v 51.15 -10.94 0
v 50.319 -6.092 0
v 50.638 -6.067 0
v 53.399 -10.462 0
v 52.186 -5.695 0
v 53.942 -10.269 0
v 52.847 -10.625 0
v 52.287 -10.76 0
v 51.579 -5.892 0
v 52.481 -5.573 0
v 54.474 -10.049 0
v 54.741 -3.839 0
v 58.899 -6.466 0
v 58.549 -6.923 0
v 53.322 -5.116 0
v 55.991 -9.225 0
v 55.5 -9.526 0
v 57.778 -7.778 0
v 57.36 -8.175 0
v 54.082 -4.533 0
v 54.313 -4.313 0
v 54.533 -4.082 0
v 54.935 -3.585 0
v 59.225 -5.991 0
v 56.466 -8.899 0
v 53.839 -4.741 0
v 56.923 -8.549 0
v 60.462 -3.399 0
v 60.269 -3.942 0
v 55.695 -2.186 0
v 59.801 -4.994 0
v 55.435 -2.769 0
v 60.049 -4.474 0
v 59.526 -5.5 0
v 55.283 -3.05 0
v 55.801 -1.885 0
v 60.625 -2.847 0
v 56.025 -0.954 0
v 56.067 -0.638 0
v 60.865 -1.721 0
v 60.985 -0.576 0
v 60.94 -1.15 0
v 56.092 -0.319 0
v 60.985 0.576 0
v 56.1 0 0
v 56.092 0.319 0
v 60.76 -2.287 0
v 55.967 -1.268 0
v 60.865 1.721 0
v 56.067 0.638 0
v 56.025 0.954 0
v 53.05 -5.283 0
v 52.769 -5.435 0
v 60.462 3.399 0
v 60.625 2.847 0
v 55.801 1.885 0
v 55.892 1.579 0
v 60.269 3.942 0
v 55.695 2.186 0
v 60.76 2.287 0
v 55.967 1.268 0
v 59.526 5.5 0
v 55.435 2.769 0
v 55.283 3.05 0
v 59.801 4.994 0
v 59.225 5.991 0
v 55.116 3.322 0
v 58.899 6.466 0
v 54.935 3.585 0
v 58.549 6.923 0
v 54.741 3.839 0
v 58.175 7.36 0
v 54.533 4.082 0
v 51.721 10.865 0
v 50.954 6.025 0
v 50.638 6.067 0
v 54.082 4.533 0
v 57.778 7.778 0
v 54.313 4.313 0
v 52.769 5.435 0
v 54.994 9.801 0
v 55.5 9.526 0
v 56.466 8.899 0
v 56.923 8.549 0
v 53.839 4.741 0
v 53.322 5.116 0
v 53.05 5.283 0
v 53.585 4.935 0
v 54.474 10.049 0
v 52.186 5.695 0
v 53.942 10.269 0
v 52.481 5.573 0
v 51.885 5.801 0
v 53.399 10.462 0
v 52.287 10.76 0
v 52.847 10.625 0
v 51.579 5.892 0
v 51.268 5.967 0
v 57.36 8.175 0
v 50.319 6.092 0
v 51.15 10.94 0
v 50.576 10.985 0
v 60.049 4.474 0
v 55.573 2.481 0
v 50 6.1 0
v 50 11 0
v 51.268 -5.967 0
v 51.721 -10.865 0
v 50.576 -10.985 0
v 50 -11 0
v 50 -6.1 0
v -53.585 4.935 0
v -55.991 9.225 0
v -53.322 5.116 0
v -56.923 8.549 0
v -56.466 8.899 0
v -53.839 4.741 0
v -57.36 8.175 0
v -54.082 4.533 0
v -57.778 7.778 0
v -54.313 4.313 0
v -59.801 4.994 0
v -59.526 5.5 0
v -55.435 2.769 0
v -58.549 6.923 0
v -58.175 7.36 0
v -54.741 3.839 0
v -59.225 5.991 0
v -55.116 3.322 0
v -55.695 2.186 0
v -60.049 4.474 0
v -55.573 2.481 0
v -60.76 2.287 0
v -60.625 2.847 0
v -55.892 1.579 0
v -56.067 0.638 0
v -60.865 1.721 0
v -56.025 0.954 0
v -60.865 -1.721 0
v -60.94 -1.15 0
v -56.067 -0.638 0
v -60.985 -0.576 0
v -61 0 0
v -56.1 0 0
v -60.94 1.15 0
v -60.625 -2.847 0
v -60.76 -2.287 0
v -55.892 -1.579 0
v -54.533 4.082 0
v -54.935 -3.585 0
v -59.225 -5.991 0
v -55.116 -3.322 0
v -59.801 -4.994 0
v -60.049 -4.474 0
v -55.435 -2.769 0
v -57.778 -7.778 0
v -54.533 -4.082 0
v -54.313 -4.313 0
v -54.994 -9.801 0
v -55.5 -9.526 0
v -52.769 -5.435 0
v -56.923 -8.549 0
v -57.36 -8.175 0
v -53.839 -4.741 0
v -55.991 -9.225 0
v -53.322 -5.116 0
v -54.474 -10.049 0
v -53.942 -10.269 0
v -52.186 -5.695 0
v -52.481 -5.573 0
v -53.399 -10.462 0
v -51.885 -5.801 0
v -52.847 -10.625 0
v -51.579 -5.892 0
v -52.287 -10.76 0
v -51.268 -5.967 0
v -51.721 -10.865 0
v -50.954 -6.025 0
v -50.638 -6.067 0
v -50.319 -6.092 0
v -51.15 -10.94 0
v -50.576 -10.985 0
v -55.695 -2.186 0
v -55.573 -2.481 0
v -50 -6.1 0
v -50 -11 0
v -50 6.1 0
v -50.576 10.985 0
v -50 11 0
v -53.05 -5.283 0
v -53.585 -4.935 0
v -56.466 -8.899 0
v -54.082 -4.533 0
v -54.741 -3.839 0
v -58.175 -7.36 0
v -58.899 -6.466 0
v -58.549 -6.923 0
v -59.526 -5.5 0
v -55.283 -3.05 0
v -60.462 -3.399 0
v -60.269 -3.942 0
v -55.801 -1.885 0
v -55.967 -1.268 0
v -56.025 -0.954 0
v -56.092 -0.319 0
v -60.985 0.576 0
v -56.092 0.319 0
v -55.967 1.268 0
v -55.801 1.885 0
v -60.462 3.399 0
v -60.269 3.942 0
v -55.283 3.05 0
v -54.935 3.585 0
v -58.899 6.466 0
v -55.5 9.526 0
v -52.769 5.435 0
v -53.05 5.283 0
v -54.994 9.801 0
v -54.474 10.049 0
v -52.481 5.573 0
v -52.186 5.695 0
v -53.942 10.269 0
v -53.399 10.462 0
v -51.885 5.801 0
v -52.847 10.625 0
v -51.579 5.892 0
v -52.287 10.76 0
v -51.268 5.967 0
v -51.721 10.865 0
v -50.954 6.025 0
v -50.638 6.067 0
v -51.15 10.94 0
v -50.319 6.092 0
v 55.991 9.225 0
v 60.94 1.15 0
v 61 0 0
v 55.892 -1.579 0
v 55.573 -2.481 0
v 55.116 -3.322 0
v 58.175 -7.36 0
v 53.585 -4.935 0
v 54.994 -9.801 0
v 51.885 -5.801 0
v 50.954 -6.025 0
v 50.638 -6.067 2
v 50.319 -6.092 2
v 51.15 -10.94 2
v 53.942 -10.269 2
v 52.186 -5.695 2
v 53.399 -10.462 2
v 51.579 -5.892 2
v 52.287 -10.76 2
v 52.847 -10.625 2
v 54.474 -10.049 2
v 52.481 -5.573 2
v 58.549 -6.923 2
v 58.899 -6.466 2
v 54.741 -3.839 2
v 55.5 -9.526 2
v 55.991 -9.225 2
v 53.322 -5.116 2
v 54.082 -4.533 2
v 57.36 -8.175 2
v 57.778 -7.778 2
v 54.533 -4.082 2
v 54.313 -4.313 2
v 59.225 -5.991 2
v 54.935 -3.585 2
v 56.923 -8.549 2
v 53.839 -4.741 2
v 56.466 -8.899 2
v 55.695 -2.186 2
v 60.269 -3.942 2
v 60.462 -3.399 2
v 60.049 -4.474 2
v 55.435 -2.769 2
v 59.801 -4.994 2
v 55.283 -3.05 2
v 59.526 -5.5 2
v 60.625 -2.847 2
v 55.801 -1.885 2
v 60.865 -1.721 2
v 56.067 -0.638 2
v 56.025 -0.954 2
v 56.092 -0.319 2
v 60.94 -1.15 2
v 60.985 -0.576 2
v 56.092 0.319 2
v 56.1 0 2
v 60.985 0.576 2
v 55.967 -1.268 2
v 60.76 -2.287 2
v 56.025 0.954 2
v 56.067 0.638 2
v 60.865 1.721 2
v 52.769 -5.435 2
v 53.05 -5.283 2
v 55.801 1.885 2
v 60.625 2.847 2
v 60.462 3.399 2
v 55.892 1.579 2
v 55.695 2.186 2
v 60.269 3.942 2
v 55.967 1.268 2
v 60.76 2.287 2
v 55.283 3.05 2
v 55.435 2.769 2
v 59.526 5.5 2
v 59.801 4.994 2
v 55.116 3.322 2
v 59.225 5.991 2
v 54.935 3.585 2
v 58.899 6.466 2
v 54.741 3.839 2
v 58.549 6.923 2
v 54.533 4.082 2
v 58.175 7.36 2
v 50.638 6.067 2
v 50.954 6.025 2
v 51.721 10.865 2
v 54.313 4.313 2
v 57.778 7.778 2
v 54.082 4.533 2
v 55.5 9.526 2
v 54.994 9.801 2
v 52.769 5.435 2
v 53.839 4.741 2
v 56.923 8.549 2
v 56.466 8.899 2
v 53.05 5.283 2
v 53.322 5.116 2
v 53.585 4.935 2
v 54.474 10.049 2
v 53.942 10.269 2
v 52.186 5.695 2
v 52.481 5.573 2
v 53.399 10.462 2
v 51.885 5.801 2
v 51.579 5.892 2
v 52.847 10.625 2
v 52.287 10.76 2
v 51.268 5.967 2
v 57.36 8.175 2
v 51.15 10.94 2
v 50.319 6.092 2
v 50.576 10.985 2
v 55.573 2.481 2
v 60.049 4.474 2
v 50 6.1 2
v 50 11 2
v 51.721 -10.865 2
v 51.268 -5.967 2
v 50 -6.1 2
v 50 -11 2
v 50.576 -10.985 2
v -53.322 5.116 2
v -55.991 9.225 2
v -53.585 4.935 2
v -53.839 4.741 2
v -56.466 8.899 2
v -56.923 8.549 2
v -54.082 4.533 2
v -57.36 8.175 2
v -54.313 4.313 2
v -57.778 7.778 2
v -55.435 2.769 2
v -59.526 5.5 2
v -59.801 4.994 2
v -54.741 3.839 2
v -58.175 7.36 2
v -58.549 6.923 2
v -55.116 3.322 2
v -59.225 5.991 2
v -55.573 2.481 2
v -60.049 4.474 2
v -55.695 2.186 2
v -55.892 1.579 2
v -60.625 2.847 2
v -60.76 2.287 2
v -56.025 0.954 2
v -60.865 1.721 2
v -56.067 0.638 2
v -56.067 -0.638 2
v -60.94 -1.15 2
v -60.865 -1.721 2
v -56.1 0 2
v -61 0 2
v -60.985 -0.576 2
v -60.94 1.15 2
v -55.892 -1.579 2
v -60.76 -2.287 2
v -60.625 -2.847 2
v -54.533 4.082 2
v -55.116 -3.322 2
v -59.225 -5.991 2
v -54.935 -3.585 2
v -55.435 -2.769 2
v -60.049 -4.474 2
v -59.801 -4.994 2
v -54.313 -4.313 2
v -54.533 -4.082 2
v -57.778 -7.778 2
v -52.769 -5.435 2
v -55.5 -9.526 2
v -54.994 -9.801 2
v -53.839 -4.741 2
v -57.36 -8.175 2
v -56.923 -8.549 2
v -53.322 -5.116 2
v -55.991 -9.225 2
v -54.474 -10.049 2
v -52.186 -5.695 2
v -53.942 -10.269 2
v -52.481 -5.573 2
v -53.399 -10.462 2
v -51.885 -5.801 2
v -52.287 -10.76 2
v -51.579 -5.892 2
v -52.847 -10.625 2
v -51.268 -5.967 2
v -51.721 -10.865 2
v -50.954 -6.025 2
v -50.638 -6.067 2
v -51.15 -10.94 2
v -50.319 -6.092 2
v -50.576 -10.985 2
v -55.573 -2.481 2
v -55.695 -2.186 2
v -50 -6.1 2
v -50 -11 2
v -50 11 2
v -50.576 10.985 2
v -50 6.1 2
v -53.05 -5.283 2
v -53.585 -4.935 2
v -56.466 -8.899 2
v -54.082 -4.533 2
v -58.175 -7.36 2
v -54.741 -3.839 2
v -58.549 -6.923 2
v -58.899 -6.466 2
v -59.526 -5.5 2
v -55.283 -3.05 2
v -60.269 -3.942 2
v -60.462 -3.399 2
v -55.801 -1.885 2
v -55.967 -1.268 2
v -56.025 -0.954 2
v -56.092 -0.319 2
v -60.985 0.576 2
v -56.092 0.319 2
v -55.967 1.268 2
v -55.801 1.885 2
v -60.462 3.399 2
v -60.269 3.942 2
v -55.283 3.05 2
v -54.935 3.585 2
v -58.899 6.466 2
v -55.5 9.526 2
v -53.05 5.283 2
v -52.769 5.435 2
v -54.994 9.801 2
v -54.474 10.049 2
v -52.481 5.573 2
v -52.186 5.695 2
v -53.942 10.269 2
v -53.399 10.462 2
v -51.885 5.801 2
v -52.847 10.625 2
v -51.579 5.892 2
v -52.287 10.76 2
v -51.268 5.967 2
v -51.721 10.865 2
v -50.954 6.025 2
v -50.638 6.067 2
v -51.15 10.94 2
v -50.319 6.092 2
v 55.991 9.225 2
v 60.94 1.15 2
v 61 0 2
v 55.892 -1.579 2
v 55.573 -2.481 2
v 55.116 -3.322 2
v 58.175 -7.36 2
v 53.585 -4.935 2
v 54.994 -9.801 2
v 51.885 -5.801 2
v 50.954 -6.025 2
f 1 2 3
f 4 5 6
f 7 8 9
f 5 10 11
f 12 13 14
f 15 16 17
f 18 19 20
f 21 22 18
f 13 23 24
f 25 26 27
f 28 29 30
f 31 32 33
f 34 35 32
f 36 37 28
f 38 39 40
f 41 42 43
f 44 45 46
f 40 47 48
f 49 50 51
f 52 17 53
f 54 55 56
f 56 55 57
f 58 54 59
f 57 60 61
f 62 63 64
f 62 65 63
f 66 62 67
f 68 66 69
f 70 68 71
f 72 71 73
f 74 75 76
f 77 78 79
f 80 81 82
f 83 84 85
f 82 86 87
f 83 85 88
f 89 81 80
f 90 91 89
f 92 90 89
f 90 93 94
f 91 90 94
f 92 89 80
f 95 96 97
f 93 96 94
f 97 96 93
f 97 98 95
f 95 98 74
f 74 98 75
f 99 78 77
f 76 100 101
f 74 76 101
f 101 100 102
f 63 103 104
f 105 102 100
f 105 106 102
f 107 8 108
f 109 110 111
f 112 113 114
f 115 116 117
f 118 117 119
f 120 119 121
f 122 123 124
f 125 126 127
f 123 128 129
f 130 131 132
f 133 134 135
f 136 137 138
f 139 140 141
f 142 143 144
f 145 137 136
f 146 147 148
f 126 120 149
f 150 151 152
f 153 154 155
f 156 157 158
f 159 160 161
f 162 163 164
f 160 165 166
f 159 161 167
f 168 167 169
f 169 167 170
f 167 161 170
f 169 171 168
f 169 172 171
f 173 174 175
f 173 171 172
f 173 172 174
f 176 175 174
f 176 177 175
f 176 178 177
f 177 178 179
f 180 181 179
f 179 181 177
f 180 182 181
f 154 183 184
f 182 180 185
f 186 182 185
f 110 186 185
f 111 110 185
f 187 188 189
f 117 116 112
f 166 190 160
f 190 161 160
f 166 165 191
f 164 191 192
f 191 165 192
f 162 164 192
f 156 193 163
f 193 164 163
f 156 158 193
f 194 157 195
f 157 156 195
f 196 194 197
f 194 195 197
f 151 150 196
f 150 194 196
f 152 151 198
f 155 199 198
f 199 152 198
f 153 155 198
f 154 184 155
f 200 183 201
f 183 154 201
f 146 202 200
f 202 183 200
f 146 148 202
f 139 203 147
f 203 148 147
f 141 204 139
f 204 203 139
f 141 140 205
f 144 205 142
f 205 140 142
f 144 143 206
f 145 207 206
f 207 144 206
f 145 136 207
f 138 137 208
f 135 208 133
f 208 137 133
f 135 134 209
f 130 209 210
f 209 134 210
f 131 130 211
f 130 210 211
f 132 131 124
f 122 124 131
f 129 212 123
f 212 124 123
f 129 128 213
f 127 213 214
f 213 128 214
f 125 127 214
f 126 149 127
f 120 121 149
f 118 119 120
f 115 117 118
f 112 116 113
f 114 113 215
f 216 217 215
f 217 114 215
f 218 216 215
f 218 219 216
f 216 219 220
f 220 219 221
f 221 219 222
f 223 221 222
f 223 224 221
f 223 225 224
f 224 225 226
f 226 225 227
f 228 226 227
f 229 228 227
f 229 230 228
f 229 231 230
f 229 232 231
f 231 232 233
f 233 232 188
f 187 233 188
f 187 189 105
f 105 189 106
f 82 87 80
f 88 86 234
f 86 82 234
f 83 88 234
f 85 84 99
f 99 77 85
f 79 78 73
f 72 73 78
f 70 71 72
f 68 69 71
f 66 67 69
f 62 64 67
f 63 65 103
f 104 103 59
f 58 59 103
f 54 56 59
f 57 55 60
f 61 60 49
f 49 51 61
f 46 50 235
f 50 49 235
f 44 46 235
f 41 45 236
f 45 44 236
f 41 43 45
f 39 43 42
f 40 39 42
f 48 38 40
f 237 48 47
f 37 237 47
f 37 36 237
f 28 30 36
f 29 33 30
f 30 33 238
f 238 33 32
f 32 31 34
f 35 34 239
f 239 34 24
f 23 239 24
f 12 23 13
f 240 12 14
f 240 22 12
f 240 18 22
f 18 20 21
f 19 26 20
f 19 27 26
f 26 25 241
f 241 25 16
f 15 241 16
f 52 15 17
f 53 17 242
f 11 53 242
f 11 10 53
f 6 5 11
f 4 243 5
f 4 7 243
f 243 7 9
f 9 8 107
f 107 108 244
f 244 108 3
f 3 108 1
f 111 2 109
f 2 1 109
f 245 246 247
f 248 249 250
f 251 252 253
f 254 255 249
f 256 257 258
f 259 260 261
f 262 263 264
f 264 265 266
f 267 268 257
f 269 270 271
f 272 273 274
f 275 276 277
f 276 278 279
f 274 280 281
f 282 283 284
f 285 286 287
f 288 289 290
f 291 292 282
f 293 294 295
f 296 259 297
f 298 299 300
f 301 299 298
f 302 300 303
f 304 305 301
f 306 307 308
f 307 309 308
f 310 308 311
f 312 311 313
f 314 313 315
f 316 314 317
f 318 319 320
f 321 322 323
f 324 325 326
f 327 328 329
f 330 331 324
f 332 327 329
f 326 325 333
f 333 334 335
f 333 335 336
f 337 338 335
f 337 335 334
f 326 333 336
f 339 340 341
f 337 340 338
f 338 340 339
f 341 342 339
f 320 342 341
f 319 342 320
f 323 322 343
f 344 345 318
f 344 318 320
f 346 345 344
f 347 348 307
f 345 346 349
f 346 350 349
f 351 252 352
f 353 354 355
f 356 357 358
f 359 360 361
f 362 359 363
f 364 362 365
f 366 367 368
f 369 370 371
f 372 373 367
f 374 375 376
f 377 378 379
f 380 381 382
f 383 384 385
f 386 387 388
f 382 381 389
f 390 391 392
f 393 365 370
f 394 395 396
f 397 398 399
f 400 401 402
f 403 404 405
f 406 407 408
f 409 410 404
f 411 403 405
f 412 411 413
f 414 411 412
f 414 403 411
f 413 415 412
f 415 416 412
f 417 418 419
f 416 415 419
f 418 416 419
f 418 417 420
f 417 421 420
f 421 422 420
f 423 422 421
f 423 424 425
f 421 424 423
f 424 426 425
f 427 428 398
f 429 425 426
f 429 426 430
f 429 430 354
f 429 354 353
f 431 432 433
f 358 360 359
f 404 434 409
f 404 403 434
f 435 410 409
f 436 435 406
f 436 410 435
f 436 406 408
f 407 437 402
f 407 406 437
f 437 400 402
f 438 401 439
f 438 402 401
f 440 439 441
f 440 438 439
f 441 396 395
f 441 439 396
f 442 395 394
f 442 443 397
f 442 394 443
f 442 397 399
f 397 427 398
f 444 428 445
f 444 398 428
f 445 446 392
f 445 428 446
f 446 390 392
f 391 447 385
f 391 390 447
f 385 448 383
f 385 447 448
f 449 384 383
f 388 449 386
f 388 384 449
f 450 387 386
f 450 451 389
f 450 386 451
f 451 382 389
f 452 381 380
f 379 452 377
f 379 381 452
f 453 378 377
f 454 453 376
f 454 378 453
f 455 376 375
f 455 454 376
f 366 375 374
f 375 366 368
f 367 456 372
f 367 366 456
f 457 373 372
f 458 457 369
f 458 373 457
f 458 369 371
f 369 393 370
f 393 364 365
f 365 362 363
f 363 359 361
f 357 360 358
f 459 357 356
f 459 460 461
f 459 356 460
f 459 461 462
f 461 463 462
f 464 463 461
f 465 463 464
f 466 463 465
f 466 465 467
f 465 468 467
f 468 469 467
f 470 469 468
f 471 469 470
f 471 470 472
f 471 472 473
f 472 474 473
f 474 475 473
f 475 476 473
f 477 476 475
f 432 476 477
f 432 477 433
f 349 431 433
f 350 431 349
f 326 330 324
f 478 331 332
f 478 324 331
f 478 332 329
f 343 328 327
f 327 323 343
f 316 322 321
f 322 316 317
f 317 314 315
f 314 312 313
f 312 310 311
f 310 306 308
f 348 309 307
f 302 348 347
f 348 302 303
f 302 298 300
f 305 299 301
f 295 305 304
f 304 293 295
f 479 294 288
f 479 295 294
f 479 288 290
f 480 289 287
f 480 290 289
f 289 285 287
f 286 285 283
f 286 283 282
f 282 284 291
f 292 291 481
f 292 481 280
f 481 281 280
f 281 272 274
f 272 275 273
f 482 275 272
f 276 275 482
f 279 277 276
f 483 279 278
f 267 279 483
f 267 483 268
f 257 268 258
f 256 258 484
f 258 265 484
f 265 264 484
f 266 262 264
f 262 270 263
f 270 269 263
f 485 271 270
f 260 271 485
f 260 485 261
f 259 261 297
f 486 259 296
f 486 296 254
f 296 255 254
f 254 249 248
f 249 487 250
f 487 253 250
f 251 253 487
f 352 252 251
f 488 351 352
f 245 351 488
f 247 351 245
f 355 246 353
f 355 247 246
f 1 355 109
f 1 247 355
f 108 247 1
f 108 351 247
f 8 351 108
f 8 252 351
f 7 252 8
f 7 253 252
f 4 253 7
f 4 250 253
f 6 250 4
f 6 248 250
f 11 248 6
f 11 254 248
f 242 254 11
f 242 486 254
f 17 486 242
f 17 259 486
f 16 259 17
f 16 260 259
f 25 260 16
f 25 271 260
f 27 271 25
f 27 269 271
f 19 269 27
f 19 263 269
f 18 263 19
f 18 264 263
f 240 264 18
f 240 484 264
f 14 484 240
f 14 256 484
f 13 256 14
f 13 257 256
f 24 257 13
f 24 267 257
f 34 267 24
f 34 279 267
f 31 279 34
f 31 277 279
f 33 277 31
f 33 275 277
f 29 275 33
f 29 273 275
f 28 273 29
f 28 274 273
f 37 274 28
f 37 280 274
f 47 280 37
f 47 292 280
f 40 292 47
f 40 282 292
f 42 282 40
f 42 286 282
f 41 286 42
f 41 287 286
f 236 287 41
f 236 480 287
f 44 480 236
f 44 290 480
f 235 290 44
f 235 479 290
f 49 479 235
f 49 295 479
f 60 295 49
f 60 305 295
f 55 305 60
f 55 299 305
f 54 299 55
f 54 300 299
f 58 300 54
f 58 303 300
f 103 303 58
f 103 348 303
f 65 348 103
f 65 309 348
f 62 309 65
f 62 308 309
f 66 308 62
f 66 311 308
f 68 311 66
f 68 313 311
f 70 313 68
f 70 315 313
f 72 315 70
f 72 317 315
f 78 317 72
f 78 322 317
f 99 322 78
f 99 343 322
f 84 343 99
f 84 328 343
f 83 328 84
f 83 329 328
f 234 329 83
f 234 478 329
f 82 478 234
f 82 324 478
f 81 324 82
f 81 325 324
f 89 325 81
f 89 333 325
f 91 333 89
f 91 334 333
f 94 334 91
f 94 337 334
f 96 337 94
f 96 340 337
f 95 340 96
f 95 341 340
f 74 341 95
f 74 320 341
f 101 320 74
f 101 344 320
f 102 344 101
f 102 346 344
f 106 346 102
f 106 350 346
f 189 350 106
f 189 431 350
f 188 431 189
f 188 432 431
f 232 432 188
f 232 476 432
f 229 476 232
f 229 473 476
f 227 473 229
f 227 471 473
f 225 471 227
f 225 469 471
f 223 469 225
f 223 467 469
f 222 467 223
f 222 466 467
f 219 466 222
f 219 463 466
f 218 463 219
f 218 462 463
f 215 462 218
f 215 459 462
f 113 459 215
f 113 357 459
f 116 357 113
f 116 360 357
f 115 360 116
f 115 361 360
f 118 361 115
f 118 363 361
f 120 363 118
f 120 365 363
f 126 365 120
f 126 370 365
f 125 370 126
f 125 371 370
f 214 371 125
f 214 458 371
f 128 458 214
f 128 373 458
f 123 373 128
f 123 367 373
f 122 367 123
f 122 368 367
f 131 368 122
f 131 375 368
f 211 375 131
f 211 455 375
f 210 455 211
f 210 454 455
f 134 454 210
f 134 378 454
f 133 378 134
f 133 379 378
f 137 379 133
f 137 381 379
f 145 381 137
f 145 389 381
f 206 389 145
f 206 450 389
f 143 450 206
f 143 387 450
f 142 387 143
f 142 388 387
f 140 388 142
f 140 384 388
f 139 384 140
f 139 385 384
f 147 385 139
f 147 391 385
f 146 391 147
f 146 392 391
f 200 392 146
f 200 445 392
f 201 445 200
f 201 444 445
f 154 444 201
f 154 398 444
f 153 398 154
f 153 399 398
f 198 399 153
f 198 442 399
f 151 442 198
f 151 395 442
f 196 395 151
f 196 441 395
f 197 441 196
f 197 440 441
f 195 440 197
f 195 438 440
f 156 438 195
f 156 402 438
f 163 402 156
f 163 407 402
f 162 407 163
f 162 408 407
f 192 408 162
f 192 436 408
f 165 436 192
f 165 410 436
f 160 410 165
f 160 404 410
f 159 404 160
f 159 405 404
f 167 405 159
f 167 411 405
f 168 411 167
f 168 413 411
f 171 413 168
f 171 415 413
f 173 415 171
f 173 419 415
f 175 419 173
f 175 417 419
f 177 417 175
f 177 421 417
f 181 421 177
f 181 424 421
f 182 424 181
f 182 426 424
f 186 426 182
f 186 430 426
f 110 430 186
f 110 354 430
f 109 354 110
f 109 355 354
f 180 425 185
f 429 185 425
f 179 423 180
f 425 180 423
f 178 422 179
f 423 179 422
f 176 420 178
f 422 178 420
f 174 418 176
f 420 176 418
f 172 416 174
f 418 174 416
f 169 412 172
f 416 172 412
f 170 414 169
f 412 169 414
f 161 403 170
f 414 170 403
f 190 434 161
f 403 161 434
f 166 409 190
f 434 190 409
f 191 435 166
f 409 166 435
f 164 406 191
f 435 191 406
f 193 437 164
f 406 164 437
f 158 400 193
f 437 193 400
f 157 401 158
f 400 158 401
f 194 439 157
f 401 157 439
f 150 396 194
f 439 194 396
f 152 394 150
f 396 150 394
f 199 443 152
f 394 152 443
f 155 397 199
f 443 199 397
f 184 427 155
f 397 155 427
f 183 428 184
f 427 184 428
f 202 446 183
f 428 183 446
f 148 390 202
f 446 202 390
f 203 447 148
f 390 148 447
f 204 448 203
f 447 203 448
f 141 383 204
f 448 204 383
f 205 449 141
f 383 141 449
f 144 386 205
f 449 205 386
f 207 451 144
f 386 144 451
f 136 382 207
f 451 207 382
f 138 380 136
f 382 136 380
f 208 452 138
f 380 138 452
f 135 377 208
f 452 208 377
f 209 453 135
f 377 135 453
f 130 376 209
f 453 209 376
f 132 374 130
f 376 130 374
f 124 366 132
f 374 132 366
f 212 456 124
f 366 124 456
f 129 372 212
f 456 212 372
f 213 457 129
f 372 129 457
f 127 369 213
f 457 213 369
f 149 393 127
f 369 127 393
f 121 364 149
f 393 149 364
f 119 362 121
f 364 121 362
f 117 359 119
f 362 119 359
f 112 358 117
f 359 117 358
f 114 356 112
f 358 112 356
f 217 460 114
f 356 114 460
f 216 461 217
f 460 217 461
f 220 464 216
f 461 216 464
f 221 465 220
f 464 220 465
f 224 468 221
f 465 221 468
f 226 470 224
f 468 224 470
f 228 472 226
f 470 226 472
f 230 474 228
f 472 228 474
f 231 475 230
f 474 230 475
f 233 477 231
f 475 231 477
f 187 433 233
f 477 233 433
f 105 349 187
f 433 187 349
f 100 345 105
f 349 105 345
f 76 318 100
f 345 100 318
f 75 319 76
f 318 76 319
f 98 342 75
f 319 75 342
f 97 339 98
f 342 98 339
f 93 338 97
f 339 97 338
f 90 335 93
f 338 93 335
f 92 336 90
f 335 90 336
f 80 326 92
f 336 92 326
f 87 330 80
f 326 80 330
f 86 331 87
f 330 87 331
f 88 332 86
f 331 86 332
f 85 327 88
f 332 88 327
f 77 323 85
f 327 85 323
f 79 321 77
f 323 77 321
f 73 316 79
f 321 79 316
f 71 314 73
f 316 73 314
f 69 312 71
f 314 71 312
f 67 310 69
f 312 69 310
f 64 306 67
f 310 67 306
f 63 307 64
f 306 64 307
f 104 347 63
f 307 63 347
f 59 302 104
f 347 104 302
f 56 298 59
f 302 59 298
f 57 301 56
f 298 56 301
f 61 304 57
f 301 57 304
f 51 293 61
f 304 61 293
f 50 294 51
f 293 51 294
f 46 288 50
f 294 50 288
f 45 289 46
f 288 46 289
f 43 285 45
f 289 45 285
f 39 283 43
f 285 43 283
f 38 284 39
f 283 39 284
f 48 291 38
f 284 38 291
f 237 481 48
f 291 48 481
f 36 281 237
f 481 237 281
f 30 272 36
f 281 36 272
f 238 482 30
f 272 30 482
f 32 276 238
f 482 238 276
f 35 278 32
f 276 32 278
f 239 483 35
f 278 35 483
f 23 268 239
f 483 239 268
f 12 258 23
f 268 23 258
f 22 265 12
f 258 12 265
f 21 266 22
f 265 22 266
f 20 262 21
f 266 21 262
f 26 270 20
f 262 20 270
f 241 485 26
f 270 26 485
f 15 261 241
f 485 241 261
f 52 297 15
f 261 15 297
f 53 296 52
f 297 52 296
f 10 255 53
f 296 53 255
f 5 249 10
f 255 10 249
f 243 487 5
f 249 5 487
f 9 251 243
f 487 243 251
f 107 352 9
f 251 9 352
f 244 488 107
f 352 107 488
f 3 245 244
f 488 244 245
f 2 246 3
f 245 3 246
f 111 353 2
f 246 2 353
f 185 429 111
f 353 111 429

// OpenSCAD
$fn=120; // résolution 

diam_buse=0.4;          // penser à la compenstion http://reprap.org/wiki/ArcCompensation si vous êtes sur mettre 0
                        // laisser 0 ou reneigner le diametre de la buse
entraxe=100;            // entraxe des vis en mm
diam_vis=12;            // diametre des vis en mm   
epaisseur_z=2;          // epaisseur de la piece en mm
epaisseur_bord=5;       // epaisseur des bords en mm




linear_extrude(epaisseur_z){ // "épaississement" de la piece par rapport à l'epaisseur_z
difference(){
hull(){
translate ([entraxe/2,0,0 ])     circle (d=diam_vis +(epaisseur_bord*2), center = true);   // diam_vis exentré + epaisseur_bord en X
translate ([-entraxe/2,0,0 ])    circle (d=diam_vis +(epaisseur_bord*2), center = true);  // diam_vis exentré + epaisseur_bord  en -X
      }
hull(){
translate ([entraxe/2,0,0 ])    circle (d=diam_vis+(diam_buse/2), center = true); // diametre des vis en mm exentré en X
translate ([-entraxe/2,0,0 ])    circle (d=diam_vis+(diam_buse/2), center = true); // diametre des vis en mm exentré en -X
      }
            }
                           }
